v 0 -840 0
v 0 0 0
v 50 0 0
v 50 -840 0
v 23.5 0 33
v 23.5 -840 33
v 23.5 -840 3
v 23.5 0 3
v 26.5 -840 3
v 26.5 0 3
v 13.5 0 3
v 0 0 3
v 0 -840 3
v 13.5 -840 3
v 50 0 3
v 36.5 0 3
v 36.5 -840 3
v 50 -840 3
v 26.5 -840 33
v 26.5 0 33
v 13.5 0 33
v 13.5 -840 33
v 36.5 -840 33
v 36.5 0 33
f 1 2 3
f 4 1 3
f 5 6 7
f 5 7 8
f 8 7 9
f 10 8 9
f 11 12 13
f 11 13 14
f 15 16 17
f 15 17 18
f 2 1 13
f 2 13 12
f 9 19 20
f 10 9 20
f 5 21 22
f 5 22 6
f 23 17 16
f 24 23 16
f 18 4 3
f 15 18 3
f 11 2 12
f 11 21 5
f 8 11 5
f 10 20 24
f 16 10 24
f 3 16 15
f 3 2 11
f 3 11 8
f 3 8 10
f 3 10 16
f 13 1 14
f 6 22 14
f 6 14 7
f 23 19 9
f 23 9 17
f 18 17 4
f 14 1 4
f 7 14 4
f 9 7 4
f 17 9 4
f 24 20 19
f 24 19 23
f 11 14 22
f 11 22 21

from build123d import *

# Parameters (mm, degrees)
SKETCH1_W           = 50
SKETCH1_H           = 840
BOSS_EXTRUDE1_DEPTH = 3
SKETCH2_W           = 23
SKETCH2_H           = 840
BOSS_EXTRUDE2_DEPTH = 30
SKETCH3_W           = 3
SKETCH3_H           = 840
CUT_EXTRUDE1_DEPTH  = 30


with BuildPart() as part:
    # Sketch1 → Boss-Extrude1 (new body)
    with BuildSketch(Plane.XY):
        with Locations((25, -420)):
            Rectangle(SKETCH1_W, SKETCH1_H)
    extrude(amount=BOSS_EXTRUDE1_DEPTH)

    # Sketch2 → Boss-Extrude2 (add)
    with BuildSketch(Plane.XY.offset(3)):
        with Locations((25, -420)):
            Rectangle(SKETCH2_W, SKETCH2_H)
    extrude(amount=BOSS_EXTRUDE2_DEPTH)

    # Sketch3 → Cut-Extrude1 (cut)
    with BuildSketch(Plane.XY.offset(33)):
        with Locations((25, -420)):
            Rectangle(SKETCH3_W, SKETCH3_H)
    extrude(amount=-CUT_EXTRUDE1_DEPTH, mode=Mode.SUBTRACT)


solid = part.part
